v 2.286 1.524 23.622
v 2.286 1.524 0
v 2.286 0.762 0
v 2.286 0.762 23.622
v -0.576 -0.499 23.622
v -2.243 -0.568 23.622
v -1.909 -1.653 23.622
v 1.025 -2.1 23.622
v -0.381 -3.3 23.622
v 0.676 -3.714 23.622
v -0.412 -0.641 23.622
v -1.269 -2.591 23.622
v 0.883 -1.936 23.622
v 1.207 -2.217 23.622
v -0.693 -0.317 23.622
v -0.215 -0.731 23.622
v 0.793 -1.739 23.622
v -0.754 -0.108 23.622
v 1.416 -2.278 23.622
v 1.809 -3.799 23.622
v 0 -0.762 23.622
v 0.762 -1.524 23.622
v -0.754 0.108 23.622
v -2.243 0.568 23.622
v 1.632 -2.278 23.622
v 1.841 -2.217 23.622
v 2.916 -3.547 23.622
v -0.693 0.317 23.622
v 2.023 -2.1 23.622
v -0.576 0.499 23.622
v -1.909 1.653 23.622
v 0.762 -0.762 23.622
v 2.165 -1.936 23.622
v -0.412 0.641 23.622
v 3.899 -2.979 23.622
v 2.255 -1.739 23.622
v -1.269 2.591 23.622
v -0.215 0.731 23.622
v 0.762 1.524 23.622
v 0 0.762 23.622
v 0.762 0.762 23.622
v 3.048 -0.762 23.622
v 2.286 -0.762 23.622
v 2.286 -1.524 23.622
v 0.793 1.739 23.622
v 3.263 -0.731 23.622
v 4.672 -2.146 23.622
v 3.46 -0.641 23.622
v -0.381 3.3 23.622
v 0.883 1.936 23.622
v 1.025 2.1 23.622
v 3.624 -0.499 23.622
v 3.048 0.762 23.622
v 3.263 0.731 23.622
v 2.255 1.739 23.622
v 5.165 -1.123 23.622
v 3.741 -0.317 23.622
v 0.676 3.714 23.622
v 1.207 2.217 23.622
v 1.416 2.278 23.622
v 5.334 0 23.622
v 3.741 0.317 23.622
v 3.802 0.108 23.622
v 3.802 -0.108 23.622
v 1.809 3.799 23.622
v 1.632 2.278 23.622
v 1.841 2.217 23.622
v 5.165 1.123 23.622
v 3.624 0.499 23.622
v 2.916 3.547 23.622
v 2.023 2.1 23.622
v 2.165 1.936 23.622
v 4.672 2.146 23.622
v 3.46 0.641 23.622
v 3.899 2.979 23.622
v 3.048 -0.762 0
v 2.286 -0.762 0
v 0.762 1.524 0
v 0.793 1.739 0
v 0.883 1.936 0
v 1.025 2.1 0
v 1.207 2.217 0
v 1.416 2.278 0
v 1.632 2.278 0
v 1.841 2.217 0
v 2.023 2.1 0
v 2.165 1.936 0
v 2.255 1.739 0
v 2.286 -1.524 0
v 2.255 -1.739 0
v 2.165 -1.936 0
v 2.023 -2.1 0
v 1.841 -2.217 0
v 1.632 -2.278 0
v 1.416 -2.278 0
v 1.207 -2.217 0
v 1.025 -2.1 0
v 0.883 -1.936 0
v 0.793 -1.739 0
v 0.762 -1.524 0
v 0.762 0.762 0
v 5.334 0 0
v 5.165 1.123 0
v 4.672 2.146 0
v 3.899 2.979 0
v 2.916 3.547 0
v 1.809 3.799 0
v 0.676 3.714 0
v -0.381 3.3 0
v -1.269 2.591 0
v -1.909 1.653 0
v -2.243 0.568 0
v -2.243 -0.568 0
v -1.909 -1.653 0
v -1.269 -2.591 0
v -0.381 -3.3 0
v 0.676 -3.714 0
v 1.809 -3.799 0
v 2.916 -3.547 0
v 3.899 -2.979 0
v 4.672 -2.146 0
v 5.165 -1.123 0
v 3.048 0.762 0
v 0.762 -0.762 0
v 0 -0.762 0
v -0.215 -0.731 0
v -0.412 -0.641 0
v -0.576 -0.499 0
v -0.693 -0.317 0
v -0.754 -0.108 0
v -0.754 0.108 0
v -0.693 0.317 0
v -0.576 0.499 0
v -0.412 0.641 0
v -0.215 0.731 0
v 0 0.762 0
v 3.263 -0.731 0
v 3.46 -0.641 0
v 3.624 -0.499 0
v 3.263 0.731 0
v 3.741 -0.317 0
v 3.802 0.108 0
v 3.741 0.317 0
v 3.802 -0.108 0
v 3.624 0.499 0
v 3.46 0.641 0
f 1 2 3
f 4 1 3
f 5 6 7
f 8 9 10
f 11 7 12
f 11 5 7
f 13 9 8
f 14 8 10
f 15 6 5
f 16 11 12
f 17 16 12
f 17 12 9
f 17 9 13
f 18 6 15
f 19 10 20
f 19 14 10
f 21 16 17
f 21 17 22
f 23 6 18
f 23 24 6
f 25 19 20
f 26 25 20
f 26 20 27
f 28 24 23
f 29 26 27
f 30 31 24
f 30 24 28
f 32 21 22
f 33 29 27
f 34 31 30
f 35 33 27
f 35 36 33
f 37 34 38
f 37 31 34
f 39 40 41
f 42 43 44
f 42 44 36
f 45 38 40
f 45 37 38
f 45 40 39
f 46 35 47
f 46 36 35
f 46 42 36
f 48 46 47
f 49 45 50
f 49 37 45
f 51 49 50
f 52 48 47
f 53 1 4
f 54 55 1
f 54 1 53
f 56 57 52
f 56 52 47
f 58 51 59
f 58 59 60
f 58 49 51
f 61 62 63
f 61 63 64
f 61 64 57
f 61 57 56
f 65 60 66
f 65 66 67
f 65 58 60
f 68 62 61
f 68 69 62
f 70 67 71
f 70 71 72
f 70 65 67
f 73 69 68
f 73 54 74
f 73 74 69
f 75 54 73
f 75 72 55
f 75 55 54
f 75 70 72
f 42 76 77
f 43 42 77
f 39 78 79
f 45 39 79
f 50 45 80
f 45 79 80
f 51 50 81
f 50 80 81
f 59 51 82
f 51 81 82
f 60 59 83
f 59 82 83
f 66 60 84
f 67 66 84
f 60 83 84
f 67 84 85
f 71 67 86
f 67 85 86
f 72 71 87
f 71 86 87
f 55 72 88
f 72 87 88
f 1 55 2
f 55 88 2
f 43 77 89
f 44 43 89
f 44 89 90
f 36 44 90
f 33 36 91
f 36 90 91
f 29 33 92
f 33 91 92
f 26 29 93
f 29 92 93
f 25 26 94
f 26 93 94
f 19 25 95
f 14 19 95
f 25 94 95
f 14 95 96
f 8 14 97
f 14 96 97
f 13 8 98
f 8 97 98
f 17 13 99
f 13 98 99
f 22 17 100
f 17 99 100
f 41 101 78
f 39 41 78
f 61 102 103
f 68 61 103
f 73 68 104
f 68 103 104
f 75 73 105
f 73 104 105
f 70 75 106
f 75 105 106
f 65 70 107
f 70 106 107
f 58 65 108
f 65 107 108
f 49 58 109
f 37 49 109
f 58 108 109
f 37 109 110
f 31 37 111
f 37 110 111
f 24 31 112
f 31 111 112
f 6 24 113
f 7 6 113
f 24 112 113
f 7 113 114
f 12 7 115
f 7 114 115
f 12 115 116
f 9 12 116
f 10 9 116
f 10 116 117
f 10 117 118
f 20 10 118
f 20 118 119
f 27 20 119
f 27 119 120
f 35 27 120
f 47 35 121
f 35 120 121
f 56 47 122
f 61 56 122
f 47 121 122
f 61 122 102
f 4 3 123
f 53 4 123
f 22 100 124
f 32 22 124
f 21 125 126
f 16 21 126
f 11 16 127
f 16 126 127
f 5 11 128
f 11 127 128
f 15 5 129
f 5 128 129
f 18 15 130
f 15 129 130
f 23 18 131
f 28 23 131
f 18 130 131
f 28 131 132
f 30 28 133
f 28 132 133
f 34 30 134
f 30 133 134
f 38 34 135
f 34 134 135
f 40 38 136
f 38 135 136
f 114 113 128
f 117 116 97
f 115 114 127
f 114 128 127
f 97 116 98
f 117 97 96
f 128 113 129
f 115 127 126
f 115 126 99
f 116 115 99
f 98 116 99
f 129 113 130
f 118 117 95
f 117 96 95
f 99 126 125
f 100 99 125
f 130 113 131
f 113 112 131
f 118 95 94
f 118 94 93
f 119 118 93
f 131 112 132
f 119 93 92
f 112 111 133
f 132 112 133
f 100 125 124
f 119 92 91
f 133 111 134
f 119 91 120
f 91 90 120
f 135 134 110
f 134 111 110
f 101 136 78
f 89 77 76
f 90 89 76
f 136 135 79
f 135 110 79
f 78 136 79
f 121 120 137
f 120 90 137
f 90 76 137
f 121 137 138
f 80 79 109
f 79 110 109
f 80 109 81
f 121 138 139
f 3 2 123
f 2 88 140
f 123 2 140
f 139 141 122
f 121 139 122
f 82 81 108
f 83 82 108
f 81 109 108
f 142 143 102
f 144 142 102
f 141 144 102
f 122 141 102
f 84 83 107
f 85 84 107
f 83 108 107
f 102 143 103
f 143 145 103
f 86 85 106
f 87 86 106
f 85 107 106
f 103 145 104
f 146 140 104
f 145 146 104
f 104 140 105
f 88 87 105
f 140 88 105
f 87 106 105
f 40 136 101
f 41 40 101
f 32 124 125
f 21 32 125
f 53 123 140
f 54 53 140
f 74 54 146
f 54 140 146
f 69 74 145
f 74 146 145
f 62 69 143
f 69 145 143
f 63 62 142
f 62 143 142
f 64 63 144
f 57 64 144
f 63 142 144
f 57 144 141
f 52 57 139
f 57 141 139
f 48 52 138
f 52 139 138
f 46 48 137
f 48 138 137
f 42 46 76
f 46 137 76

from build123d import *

# Parameters (mm, degrees)
SKETCH1_R           = 3.81
BOSS_EXTRUDE1_DEPTH = 23.622


with BuildPart() as part:
    # Sketch1 → Boss-Extrude1 (new body)
    with BuildSketch(Plane.XY):
        with Locations((1.524, 0)):
            Circle(SKETCH1_R)
        with BuildLine():
            ThreePointArc((0, -0.762), (-0.762, 0), (0, 0.762))
            Line((0, 0.762), (0.762, 0.762))
            Line((0.762, 0.762), (0.762, 1.524))
            ThreePointArc((0.762, 1.524), (1.524, 2.286), (2.286, 1.524))
            Line((2.286, 1.524), (2.286, 0.762))
            Line((2.286, 0.762), (3.048, 0.762))
            ThreePointArc((3.048, 0.762), (3.81, 0), (3.048, -0.762))
            Line((3.048, -0.762), (2.286, -0.762))
            Line((2.286, -0.762), (2.286, -1.524))
            ThreePointArc((2.286, -1.524), (1.524, -2.286), (0.762, -1.524))
            Line((0.762, -1.524), (0.762, -0.762))
            Line((0.762, -0.762), (0, -0.762))
        make_face(mode=Mode.SUBTRACT)
    extrude(amount=BOSS_EXTRUDE1_DEPTH)


solid = part.part
